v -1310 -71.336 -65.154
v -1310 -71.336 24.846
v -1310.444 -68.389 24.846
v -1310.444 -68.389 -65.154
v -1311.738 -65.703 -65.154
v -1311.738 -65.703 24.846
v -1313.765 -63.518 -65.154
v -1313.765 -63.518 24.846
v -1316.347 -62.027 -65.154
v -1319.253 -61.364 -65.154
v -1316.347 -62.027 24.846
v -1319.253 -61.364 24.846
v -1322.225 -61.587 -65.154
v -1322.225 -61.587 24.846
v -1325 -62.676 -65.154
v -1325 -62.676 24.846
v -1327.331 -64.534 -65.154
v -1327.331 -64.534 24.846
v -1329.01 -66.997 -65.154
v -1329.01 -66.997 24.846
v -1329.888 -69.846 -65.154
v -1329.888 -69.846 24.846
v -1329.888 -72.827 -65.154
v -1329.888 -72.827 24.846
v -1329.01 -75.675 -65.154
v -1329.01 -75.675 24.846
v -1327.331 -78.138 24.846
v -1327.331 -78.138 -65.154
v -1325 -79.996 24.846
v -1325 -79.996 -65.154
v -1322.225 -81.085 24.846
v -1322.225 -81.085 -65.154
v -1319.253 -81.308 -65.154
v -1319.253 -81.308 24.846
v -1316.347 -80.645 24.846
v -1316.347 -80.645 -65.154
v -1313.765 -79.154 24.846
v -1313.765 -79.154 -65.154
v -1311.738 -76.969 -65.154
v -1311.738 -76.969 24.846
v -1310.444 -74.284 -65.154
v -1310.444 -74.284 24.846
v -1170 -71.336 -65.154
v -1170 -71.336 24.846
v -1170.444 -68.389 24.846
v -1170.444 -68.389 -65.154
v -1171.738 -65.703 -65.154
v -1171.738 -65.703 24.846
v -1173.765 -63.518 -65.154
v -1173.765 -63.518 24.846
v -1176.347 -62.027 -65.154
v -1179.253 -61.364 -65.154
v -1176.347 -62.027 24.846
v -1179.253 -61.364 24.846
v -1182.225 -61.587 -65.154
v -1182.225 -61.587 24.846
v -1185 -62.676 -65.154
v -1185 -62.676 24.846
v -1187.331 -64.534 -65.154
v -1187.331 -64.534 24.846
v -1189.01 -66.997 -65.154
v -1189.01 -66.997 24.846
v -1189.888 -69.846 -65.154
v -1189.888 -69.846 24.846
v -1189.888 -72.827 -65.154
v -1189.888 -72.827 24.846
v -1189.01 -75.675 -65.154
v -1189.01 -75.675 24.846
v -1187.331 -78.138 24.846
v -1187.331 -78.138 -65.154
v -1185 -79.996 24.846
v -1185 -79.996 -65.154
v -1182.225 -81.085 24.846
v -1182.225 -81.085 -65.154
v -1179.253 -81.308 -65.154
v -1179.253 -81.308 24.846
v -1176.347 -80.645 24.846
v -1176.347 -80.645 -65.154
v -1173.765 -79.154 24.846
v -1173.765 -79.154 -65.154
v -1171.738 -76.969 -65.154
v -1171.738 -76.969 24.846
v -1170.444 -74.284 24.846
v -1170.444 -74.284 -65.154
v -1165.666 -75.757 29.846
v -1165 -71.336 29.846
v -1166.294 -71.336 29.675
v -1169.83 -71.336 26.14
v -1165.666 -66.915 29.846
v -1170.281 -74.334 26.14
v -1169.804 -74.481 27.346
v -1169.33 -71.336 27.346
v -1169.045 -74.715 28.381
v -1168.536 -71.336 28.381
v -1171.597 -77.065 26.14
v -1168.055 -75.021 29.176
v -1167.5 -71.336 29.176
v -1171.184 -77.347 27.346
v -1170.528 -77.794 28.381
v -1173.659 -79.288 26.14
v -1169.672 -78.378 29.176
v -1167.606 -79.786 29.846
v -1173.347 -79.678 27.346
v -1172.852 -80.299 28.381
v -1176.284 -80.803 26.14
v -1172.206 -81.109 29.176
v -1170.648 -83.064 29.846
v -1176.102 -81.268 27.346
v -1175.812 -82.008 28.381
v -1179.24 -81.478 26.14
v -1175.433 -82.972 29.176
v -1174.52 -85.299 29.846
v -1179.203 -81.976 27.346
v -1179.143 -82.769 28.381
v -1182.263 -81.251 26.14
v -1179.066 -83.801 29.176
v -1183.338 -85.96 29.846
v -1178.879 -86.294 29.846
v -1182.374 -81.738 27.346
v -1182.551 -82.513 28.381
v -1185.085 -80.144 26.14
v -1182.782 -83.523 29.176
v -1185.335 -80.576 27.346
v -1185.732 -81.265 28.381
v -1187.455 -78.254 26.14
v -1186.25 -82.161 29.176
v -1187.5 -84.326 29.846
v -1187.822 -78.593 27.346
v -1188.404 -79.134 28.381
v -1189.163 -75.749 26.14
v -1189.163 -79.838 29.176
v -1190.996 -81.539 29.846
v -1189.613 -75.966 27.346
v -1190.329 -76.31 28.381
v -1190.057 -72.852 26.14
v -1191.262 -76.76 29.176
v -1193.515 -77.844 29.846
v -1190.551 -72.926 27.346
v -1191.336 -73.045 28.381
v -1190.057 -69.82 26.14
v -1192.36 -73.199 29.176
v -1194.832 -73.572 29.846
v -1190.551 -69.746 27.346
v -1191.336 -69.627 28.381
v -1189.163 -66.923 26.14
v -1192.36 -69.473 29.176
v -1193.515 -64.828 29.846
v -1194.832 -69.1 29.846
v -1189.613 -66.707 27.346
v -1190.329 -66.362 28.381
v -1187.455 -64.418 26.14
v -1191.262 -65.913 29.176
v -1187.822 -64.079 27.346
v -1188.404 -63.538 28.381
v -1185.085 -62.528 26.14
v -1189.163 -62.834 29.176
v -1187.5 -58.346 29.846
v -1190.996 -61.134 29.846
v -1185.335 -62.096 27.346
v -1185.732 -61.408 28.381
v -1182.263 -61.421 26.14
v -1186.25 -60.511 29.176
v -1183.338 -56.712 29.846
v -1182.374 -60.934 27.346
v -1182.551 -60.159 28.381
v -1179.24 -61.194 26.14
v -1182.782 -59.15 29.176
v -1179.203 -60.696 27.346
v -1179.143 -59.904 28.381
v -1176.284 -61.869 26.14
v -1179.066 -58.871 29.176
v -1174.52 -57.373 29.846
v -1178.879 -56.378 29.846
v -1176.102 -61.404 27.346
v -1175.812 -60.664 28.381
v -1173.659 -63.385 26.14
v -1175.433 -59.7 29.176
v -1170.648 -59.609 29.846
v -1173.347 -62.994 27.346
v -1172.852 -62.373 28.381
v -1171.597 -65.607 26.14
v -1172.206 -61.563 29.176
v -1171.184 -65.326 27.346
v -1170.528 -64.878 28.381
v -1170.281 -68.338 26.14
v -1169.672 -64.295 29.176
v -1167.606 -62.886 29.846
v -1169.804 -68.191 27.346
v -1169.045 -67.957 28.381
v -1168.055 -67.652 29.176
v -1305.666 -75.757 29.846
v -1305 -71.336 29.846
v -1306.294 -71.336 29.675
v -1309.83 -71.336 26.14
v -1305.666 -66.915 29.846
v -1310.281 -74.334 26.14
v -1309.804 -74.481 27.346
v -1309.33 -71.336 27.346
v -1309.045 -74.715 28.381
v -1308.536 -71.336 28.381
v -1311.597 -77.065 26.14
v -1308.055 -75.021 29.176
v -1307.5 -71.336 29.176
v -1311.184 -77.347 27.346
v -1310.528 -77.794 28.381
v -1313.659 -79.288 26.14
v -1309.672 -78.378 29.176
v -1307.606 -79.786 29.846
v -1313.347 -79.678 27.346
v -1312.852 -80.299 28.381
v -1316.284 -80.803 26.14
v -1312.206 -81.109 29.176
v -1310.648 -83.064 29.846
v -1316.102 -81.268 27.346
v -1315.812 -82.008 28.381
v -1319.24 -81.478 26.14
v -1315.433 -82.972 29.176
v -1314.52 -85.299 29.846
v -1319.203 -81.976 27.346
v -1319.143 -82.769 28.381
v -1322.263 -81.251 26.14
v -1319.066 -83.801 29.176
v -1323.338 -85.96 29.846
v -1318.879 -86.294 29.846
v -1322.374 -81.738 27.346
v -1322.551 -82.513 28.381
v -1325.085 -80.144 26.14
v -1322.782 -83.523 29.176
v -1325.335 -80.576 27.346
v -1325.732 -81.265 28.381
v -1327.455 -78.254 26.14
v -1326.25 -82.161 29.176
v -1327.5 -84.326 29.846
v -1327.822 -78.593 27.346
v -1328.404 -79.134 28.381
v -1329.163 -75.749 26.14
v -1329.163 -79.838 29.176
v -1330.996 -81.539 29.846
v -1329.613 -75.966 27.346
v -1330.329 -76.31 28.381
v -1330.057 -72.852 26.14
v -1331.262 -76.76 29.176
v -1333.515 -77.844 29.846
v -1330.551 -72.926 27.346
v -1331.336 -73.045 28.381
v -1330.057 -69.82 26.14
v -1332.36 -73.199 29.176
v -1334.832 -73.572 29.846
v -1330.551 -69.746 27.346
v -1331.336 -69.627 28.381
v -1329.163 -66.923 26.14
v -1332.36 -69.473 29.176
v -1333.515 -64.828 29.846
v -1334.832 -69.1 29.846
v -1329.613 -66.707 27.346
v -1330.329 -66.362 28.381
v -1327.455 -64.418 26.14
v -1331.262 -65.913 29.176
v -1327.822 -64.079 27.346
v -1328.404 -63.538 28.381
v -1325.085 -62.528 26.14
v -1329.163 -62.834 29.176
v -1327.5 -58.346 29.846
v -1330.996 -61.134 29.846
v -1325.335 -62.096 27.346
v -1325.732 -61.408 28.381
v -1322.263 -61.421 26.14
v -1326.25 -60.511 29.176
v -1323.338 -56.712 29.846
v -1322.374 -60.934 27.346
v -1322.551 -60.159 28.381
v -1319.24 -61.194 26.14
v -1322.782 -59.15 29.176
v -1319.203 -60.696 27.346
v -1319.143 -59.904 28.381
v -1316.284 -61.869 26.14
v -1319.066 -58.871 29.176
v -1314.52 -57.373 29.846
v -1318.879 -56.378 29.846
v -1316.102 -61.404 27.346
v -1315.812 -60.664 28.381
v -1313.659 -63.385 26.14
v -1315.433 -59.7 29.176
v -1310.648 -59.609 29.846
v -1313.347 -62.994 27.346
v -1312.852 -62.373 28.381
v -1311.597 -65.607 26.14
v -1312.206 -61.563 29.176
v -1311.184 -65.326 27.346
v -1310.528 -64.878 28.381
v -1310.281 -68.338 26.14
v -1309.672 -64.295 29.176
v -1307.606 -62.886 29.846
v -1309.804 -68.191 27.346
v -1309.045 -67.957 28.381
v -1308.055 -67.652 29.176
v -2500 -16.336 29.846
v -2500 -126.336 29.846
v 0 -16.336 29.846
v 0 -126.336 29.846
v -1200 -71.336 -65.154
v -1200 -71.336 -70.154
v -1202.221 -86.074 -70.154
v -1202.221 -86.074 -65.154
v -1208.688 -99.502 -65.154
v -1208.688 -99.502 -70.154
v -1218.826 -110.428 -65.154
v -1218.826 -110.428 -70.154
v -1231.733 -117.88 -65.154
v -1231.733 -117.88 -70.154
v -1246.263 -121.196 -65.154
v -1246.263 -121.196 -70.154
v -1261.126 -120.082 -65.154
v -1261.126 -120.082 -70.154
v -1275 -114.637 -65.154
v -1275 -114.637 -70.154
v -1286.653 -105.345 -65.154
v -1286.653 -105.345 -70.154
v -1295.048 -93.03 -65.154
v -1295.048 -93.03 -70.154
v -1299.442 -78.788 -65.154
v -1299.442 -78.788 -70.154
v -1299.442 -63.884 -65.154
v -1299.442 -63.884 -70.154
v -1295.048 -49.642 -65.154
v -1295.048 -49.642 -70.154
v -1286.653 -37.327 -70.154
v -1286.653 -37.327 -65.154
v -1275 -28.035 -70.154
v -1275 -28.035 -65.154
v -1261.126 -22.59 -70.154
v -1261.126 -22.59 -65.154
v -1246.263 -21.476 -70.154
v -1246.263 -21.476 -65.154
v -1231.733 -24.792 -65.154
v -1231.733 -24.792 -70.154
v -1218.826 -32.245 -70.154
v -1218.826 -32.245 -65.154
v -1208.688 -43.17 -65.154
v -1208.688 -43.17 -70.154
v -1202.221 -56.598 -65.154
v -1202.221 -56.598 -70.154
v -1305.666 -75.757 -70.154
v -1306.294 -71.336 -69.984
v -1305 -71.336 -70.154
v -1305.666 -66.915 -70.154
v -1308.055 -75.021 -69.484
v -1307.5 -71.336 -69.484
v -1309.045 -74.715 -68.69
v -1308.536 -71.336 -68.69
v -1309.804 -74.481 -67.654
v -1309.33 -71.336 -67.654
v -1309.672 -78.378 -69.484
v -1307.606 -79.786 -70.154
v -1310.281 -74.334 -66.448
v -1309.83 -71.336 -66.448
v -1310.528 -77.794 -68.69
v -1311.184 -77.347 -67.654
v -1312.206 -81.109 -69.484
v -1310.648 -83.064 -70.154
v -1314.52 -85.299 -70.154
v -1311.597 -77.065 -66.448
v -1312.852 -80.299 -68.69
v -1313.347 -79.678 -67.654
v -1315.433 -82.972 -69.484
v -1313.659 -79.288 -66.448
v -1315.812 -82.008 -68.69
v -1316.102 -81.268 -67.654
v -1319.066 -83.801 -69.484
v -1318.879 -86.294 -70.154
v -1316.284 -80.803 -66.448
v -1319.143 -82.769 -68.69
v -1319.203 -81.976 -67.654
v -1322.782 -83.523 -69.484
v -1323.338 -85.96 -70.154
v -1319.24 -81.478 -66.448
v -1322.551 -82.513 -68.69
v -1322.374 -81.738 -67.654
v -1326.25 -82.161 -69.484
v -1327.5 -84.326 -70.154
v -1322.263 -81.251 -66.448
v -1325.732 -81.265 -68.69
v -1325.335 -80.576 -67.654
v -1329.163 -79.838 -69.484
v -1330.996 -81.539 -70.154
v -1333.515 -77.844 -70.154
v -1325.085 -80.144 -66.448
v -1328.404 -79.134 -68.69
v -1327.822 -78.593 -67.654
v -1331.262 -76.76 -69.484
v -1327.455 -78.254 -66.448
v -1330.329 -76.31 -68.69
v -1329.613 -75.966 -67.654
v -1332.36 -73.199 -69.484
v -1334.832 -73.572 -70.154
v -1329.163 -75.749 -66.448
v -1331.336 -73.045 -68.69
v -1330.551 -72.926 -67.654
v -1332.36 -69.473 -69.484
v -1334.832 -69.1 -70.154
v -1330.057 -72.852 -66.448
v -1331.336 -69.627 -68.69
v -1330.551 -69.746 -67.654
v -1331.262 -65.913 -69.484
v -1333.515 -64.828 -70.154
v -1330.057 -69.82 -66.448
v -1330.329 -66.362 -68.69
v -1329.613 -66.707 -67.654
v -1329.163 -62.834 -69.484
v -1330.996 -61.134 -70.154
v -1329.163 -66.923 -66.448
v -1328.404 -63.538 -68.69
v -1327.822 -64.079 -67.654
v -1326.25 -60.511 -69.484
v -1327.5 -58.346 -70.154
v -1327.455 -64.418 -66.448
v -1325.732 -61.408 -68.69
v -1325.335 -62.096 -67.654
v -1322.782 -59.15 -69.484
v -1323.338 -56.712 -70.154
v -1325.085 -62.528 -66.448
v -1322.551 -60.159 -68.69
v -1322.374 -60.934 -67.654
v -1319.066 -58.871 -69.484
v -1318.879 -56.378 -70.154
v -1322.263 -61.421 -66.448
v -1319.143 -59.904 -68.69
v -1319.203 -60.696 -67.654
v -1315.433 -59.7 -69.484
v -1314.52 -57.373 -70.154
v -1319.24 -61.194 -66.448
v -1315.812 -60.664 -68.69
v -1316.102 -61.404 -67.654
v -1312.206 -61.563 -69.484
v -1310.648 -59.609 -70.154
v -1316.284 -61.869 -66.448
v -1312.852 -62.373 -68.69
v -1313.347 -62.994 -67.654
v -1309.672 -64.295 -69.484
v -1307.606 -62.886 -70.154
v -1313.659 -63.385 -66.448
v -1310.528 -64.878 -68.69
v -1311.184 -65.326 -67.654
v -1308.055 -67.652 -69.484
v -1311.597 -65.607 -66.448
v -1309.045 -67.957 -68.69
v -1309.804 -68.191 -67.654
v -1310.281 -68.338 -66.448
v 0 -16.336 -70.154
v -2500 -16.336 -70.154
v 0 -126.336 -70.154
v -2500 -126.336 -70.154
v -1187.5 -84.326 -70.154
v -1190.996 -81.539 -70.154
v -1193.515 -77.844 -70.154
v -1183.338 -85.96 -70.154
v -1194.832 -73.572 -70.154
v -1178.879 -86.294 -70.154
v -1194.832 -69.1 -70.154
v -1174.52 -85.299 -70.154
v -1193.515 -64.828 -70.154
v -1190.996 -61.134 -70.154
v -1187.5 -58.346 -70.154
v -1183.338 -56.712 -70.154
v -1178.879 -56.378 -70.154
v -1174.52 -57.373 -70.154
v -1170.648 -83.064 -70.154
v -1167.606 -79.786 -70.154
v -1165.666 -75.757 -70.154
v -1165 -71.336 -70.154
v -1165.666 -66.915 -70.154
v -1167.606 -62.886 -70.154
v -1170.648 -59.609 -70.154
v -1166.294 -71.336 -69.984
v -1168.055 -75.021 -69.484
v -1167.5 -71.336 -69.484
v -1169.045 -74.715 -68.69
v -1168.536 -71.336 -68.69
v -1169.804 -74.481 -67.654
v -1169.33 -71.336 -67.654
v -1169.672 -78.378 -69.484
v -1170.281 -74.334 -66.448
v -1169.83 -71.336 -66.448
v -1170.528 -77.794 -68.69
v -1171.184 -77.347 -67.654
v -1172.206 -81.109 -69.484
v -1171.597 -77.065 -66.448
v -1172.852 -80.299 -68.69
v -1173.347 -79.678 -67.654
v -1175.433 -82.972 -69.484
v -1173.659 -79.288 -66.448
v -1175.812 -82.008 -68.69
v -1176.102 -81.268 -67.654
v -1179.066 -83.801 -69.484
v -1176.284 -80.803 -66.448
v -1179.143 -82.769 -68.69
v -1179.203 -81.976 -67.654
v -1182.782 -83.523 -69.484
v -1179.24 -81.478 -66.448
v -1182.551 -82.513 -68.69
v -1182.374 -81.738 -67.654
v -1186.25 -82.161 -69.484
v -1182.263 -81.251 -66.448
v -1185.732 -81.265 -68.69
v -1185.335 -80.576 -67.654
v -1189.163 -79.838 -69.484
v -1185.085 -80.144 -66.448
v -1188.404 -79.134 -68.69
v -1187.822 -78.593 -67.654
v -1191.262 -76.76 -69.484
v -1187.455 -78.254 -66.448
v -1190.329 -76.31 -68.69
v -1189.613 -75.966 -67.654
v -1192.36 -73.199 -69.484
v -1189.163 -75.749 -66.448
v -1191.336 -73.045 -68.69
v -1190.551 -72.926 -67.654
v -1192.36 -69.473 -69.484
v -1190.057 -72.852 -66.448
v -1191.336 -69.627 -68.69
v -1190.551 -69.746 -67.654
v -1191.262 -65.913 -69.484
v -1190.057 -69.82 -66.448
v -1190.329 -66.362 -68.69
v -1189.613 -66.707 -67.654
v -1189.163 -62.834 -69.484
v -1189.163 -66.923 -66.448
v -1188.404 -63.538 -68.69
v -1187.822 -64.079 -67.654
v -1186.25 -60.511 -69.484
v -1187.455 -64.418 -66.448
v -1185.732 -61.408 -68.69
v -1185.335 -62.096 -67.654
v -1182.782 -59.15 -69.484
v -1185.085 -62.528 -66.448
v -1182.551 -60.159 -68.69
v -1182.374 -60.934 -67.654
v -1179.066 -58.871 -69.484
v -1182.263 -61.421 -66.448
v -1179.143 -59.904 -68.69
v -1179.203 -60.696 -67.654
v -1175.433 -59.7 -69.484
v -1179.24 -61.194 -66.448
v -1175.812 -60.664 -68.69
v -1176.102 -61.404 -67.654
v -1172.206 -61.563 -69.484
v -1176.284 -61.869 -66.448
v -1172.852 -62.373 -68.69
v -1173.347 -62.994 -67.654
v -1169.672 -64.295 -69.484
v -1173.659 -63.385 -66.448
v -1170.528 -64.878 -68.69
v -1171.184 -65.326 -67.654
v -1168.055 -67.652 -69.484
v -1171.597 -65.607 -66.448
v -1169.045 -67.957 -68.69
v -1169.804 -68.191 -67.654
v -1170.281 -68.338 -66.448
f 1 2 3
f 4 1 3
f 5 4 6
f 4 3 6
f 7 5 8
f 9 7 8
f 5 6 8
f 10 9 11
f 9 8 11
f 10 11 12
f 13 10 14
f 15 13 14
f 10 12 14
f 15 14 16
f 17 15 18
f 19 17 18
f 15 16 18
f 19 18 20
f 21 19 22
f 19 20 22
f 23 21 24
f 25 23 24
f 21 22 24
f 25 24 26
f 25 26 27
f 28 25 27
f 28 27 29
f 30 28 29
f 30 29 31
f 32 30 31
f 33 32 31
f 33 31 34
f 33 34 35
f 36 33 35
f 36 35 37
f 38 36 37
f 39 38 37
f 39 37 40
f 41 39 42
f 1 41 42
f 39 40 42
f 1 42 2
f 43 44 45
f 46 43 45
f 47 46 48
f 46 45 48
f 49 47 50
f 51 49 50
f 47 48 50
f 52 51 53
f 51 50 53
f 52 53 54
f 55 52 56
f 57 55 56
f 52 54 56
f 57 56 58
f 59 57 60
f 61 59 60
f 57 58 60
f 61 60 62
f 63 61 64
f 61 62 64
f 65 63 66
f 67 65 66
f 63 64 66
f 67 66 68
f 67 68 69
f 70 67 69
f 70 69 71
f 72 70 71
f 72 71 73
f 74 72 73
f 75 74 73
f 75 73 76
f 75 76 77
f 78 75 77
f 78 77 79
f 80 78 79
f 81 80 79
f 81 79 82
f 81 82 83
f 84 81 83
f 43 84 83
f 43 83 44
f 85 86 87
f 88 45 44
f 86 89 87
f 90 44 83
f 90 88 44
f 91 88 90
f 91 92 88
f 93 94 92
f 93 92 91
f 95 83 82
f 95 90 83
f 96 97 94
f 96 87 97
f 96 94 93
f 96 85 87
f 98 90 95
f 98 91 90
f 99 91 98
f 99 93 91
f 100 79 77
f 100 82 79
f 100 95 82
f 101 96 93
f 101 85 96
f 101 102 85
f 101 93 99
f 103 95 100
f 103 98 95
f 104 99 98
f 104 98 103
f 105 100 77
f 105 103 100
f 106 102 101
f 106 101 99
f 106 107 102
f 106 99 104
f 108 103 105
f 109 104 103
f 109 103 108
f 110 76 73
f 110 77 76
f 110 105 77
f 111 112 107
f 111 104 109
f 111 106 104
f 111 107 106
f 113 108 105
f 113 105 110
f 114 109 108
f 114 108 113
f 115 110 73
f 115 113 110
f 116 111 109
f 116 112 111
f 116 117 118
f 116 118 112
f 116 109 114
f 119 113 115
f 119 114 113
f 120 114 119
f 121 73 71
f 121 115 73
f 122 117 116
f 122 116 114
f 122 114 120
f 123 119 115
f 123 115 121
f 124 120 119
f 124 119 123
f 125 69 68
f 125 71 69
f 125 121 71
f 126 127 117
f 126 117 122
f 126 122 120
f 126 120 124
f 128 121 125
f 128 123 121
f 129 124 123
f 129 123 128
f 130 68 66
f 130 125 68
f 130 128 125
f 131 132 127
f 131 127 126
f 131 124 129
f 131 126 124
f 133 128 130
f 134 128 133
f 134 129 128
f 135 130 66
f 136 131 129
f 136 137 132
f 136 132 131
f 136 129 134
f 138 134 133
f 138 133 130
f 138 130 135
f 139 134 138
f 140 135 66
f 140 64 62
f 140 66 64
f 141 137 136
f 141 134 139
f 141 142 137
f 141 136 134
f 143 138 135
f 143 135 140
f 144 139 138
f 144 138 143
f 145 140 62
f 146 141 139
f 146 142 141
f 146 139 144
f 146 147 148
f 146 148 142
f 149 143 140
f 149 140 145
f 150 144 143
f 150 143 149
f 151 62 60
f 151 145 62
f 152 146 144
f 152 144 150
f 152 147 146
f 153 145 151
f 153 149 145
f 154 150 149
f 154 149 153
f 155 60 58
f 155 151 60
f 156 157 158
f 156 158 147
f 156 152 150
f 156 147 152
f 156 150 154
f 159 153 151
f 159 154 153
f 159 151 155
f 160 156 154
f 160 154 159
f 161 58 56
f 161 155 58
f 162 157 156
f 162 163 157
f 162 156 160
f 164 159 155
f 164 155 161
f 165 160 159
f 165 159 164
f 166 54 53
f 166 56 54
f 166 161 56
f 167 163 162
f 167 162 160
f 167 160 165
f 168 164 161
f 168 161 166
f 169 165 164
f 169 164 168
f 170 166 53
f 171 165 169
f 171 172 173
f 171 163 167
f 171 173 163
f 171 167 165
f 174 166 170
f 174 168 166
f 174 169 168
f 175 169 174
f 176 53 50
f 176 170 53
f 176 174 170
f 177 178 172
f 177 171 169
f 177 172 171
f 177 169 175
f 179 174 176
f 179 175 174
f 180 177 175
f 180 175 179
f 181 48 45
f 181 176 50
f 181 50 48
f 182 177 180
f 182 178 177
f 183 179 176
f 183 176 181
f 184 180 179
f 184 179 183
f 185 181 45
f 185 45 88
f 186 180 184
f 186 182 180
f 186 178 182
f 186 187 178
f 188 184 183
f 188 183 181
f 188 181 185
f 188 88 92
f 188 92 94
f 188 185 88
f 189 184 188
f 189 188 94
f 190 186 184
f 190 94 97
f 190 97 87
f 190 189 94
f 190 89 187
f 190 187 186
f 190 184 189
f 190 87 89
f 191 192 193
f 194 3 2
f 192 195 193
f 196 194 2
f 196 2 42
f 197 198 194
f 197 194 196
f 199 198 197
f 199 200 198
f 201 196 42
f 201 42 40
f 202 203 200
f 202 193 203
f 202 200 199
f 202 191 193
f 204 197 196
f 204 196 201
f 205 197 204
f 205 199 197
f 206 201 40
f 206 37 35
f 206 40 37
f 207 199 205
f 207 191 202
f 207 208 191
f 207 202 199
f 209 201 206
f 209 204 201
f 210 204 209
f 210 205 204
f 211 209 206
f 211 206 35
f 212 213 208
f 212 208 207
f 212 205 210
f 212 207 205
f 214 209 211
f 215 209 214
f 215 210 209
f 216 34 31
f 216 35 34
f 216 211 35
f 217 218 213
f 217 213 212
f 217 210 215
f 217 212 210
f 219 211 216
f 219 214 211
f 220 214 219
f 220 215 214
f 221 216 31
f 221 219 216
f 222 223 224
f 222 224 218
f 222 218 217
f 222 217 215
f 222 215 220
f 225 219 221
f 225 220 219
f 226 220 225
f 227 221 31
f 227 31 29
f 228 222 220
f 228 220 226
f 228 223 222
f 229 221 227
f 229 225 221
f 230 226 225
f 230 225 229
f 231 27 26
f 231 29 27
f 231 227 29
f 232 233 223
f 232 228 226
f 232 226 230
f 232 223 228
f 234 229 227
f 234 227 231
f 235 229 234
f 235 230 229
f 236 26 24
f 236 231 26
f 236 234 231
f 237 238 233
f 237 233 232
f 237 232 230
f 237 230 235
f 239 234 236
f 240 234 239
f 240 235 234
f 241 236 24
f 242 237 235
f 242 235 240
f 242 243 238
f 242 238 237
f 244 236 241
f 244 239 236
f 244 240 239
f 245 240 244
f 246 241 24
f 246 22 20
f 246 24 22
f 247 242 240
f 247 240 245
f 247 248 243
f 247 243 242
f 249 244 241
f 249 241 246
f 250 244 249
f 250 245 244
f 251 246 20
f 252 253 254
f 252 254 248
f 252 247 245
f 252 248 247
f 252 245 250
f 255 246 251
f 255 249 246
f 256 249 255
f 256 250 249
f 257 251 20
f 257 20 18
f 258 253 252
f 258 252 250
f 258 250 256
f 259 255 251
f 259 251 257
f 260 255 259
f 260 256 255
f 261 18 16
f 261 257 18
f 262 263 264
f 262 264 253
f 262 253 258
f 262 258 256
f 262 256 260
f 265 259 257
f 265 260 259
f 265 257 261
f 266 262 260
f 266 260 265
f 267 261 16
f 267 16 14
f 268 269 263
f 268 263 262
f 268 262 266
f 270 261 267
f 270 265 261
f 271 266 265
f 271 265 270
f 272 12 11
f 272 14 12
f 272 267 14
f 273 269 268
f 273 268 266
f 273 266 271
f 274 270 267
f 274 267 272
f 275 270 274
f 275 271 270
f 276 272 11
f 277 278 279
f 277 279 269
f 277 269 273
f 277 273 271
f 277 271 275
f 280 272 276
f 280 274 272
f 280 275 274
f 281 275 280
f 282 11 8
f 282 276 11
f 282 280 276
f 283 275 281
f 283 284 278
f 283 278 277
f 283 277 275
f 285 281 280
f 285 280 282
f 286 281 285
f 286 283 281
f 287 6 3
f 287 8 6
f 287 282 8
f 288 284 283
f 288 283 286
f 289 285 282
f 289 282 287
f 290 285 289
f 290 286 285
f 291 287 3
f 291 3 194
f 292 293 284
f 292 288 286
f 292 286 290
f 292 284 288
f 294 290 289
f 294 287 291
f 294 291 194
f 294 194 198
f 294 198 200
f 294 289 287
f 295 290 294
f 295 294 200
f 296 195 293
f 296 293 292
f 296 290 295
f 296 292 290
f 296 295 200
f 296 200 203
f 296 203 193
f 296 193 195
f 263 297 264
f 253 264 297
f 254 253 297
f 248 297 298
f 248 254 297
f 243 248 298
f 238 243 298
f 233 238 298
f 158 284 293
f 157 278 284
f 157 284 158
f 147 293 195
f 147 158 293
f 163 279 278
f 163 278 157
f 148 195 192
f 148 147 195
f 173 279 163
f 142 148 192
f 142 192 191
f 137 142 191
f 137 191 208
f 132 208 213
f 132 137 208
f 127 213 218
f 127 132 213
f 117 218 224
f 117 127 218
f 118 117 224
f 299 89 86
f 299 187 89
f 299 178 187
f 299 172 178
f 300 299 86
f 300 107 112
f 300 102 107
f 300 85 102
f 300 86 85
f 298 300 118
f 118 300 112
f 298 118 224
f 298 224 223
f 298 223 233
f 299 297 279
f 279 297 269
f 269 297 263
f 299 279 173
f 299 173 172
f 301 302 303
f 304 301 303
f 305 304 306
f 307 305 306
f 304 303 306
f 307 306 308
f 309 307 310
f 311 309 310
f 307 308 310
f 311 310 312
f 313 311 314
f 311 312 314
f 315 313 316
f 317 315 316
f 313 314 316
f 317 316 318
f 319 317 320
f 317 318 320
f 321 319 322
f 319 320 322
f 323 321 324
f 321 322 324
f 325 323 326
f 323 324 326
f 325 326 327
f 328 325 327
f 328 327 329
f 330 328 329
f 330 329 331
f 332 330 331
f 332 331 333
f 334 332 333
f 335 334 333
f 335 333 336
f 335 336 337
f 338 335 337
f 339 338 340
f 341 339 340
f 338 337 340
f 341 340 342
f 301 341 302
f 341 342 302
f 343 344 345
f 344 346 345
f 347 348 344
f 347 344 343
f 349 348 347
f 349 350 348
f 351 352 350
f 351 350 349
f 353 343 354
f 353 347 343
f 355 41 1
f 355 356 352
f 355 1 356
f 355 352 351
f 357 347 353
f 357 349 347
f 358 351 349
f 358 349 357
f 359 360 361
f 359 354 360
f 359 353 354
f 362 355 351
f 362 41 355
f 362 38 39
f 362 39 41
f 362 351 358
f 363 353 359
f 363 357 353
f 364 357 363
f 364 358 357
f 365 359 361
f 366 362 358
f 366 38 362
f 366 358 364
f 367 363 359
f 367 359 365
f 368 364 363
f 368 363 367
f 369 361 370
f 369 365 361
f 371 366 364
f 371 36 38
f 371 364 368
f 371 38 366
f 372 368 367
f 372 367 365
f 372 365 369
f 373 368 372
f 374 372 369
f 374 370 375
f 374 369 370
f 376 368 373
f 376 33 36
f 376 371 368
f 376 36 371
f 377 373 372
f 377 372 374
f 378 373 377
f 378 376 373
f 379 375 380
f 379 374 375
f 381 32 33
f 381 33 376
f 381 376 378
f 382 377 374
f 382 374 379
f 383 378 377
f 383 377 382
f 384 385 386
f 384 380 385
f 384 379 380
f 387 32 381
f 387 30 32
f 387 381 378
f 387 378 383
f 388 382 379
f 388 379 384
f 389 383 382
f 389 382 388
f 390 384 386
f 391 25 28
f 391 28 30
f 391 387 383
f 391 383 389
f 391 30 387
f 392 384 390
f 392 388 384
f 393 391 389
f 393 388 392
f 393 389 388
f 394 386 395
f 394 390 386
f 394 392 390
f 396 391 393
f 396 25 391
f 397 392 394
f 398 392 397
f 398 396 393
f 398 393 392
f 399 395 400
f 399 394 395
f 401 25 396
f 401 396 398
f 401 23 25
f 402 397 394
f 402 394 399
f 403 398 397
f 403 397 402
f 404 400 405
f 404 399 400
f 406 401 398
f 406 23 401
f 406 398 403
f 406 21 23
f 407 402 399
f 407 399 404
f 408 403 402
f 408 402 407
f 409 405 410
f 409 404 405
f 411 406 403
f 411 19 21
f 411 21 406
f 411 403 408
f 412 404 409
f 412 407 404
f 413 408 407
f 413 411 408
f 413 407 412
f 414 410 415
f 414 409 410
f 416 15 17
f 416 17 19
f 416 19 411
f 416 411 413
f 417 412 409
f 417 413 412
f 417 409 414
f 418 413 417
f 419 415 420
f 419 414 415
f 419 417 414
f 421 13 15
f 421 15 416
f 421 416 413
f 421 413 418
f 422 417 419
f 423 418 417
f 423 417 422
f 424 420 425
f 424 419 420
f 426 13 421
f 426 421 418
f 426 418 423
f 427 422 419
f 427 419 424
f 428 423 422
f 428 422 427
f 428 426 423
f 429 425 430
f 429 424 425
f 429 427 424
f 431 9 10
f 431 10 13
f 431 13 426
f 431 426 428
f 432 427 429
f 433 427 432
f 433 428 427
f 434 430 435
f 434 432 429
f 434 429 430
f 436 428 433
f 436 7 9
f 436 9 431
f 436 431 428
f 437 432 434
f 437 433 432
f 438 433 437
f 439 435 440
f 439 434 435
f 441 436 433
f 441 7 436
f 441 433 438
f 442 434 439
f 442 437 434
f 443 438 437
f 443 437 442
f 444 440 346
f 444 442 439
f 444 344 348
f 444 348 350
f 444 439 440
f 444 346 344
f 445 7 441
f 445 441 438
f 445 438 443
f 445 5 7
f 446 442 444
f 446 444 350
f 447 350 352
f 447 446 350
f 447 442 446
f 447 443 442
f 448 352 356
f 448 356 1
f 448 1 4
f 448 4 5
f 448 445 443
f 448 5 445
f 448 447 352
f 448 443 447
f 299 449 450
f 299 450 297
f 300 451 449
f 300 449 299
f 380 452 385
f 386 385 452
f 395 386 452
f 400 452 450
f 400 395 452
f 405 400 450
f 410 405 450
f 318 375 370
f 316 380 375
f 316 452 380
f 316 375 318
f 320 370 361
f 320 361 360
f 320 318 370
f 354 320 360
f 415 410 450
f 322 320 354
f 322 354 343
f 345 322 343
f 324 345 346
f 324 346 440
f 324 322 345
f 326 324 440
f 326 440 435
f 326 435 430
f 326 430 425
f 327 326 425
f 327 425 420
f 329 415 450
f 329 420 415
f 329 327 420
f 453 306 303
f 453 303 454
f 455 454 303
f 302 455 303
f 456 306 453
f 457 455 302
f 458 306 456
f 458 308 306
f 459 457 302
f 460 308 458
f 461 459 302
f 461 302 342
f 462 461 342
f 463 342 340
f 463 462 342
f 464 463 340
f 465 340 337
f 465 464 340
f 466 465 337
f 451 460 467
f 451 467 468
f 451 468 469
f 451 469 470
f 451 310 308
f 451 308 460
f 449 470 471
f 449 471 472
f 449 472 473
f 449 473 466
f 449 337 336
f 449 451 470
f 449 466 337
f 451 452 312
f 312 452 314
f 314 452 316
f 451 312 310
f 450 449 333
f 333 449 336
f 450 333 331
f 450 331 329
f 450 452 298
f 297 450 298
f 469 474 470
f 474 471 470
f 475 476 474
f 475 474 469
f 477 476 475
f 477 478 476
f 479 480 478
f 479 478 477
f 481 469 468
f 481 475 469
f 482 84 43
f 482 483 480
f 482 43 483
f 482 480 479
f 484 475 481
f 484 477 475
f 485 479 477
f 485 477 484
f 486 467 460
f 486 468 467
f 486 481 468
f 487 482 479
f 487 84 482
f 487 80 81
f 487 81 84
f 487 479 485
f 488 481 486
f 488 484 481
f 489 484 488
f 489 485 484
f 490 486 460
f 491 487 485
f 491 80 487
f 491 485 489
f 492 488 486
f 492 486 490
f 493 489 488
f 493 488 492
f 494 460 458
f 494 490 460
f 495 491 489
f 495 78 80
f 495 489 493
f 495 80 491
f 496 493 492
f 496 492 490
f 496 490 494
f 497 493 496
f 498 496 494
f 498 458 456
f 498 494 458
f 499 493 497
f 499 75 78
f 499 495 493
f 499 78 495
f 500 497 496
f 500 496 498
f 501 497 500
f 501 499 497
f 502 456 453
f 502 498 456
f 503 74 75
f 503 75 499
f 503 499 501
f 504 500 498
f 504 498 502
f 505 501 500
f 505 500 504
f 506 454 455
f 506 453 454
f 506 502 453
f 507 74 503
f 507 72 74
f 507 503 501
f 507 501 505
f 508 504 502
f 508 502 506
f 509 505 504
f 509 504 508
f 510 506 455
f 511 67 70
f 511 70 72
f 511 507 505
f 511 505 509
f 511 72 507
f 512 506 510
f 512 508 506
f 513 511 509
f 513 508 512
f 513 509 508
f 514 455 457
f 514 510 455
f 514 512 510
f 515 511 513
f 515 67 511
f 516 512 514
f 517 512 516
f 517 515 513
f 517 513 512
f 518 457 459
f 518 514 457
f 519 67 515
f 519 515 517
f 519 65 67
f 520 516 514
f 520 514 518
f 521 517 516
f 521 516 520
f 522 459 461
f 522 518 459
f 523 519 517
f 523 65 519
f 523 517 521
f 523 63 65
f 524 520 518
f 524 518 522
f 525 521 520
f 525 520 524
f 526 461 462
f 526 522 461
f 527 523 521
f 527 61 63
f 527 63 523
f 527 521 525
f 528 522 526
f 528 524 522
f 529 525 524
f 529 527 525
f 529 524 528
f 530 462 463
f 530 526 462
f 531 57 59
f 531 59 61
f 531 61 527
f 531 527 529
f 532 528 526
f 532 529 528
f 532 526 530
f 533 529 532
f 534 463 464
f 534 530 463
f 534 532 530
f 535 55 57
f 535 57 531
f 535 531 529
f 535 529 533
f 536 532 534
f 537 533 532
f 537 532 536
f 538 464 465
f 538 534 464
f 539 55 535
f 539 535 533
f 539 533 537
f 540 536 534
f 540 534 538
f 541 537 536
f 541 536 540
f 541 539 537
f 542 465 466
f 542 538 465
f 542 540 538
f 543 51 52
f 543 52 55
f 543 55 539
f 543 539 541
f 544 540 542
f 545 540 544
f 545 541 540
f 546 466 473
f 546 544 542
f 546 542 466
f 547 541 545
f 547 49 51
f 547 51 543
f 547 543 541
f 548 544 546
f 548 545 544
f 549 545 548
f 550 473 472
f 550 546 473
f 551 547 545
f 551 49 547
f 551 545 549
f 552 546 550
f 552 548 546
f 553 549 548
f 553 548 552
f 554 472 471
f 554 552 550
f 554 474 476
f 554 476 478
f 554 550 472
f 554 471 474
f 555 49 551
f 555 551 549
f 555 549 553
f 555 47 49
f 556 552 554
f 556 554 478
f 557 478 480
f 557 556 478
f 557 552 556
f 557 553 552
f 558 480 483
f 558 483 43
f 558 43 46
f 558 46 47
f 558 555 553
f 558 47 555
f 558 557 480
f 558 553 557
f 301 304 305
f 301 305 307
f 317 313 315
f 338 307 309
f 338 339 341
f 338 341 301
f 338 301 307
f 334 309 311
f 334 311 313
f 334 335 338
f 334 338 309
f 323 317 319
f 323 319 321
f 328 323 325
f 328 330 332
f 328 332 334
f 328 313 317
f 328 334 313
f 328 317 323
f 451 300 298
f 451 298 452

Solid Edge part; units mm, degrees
sketch "Sketch1" plane through (0, 0, 0) normal (1, 0, 0) x (0, 1, 0)
  line L0 (-126.3361, -70.1543) -> (-16.3361, -70.1543)
  line L1 (-16.3361, -70.1543) -> (-16.3361, 29.8457)
  line L2 (-16.3361, 29.8457) -> (-126.3361, 29.8457)
  line L3 (-126.3361, 29.8457) -> (-126.3361, -70.1543)
  dimension "D1" = 100
  dimension "D2" = 110
extrude "Protrusion1" add sketch "Sketch1" against normal blind 2500
sketch "Sketch2" plane through (-1250, -71.3361, -70.1543) normal (0, 0, -1) x (1, 0, 0)
  circle A0 centre (0, 0) radius 50
extrude "ExtrudedCutout_2" cut sketch "Sketch2" against normal blind 5
sketch "Sketch3" plane through (-1250, -71.3361, 29.8457) normal (0, 0, 1) x (1, 0, 0)
  circle A0 centre (-70, 0) radius 10
  circle A1 centre (70, 0) radius 10
  dimension "D1" = 70
  dimension "D2" = 70
extrude "Cutout1" cut sketch "Sketch3" against normal through all
fillet "Round_1" radius 5 4 edges at (-1330, -71.3361, 29.8457) (-1310, -71.3361, -70.1543) (-1190, -71.3361, 29.8457) (-1170, -71.3361, -70.1543)
